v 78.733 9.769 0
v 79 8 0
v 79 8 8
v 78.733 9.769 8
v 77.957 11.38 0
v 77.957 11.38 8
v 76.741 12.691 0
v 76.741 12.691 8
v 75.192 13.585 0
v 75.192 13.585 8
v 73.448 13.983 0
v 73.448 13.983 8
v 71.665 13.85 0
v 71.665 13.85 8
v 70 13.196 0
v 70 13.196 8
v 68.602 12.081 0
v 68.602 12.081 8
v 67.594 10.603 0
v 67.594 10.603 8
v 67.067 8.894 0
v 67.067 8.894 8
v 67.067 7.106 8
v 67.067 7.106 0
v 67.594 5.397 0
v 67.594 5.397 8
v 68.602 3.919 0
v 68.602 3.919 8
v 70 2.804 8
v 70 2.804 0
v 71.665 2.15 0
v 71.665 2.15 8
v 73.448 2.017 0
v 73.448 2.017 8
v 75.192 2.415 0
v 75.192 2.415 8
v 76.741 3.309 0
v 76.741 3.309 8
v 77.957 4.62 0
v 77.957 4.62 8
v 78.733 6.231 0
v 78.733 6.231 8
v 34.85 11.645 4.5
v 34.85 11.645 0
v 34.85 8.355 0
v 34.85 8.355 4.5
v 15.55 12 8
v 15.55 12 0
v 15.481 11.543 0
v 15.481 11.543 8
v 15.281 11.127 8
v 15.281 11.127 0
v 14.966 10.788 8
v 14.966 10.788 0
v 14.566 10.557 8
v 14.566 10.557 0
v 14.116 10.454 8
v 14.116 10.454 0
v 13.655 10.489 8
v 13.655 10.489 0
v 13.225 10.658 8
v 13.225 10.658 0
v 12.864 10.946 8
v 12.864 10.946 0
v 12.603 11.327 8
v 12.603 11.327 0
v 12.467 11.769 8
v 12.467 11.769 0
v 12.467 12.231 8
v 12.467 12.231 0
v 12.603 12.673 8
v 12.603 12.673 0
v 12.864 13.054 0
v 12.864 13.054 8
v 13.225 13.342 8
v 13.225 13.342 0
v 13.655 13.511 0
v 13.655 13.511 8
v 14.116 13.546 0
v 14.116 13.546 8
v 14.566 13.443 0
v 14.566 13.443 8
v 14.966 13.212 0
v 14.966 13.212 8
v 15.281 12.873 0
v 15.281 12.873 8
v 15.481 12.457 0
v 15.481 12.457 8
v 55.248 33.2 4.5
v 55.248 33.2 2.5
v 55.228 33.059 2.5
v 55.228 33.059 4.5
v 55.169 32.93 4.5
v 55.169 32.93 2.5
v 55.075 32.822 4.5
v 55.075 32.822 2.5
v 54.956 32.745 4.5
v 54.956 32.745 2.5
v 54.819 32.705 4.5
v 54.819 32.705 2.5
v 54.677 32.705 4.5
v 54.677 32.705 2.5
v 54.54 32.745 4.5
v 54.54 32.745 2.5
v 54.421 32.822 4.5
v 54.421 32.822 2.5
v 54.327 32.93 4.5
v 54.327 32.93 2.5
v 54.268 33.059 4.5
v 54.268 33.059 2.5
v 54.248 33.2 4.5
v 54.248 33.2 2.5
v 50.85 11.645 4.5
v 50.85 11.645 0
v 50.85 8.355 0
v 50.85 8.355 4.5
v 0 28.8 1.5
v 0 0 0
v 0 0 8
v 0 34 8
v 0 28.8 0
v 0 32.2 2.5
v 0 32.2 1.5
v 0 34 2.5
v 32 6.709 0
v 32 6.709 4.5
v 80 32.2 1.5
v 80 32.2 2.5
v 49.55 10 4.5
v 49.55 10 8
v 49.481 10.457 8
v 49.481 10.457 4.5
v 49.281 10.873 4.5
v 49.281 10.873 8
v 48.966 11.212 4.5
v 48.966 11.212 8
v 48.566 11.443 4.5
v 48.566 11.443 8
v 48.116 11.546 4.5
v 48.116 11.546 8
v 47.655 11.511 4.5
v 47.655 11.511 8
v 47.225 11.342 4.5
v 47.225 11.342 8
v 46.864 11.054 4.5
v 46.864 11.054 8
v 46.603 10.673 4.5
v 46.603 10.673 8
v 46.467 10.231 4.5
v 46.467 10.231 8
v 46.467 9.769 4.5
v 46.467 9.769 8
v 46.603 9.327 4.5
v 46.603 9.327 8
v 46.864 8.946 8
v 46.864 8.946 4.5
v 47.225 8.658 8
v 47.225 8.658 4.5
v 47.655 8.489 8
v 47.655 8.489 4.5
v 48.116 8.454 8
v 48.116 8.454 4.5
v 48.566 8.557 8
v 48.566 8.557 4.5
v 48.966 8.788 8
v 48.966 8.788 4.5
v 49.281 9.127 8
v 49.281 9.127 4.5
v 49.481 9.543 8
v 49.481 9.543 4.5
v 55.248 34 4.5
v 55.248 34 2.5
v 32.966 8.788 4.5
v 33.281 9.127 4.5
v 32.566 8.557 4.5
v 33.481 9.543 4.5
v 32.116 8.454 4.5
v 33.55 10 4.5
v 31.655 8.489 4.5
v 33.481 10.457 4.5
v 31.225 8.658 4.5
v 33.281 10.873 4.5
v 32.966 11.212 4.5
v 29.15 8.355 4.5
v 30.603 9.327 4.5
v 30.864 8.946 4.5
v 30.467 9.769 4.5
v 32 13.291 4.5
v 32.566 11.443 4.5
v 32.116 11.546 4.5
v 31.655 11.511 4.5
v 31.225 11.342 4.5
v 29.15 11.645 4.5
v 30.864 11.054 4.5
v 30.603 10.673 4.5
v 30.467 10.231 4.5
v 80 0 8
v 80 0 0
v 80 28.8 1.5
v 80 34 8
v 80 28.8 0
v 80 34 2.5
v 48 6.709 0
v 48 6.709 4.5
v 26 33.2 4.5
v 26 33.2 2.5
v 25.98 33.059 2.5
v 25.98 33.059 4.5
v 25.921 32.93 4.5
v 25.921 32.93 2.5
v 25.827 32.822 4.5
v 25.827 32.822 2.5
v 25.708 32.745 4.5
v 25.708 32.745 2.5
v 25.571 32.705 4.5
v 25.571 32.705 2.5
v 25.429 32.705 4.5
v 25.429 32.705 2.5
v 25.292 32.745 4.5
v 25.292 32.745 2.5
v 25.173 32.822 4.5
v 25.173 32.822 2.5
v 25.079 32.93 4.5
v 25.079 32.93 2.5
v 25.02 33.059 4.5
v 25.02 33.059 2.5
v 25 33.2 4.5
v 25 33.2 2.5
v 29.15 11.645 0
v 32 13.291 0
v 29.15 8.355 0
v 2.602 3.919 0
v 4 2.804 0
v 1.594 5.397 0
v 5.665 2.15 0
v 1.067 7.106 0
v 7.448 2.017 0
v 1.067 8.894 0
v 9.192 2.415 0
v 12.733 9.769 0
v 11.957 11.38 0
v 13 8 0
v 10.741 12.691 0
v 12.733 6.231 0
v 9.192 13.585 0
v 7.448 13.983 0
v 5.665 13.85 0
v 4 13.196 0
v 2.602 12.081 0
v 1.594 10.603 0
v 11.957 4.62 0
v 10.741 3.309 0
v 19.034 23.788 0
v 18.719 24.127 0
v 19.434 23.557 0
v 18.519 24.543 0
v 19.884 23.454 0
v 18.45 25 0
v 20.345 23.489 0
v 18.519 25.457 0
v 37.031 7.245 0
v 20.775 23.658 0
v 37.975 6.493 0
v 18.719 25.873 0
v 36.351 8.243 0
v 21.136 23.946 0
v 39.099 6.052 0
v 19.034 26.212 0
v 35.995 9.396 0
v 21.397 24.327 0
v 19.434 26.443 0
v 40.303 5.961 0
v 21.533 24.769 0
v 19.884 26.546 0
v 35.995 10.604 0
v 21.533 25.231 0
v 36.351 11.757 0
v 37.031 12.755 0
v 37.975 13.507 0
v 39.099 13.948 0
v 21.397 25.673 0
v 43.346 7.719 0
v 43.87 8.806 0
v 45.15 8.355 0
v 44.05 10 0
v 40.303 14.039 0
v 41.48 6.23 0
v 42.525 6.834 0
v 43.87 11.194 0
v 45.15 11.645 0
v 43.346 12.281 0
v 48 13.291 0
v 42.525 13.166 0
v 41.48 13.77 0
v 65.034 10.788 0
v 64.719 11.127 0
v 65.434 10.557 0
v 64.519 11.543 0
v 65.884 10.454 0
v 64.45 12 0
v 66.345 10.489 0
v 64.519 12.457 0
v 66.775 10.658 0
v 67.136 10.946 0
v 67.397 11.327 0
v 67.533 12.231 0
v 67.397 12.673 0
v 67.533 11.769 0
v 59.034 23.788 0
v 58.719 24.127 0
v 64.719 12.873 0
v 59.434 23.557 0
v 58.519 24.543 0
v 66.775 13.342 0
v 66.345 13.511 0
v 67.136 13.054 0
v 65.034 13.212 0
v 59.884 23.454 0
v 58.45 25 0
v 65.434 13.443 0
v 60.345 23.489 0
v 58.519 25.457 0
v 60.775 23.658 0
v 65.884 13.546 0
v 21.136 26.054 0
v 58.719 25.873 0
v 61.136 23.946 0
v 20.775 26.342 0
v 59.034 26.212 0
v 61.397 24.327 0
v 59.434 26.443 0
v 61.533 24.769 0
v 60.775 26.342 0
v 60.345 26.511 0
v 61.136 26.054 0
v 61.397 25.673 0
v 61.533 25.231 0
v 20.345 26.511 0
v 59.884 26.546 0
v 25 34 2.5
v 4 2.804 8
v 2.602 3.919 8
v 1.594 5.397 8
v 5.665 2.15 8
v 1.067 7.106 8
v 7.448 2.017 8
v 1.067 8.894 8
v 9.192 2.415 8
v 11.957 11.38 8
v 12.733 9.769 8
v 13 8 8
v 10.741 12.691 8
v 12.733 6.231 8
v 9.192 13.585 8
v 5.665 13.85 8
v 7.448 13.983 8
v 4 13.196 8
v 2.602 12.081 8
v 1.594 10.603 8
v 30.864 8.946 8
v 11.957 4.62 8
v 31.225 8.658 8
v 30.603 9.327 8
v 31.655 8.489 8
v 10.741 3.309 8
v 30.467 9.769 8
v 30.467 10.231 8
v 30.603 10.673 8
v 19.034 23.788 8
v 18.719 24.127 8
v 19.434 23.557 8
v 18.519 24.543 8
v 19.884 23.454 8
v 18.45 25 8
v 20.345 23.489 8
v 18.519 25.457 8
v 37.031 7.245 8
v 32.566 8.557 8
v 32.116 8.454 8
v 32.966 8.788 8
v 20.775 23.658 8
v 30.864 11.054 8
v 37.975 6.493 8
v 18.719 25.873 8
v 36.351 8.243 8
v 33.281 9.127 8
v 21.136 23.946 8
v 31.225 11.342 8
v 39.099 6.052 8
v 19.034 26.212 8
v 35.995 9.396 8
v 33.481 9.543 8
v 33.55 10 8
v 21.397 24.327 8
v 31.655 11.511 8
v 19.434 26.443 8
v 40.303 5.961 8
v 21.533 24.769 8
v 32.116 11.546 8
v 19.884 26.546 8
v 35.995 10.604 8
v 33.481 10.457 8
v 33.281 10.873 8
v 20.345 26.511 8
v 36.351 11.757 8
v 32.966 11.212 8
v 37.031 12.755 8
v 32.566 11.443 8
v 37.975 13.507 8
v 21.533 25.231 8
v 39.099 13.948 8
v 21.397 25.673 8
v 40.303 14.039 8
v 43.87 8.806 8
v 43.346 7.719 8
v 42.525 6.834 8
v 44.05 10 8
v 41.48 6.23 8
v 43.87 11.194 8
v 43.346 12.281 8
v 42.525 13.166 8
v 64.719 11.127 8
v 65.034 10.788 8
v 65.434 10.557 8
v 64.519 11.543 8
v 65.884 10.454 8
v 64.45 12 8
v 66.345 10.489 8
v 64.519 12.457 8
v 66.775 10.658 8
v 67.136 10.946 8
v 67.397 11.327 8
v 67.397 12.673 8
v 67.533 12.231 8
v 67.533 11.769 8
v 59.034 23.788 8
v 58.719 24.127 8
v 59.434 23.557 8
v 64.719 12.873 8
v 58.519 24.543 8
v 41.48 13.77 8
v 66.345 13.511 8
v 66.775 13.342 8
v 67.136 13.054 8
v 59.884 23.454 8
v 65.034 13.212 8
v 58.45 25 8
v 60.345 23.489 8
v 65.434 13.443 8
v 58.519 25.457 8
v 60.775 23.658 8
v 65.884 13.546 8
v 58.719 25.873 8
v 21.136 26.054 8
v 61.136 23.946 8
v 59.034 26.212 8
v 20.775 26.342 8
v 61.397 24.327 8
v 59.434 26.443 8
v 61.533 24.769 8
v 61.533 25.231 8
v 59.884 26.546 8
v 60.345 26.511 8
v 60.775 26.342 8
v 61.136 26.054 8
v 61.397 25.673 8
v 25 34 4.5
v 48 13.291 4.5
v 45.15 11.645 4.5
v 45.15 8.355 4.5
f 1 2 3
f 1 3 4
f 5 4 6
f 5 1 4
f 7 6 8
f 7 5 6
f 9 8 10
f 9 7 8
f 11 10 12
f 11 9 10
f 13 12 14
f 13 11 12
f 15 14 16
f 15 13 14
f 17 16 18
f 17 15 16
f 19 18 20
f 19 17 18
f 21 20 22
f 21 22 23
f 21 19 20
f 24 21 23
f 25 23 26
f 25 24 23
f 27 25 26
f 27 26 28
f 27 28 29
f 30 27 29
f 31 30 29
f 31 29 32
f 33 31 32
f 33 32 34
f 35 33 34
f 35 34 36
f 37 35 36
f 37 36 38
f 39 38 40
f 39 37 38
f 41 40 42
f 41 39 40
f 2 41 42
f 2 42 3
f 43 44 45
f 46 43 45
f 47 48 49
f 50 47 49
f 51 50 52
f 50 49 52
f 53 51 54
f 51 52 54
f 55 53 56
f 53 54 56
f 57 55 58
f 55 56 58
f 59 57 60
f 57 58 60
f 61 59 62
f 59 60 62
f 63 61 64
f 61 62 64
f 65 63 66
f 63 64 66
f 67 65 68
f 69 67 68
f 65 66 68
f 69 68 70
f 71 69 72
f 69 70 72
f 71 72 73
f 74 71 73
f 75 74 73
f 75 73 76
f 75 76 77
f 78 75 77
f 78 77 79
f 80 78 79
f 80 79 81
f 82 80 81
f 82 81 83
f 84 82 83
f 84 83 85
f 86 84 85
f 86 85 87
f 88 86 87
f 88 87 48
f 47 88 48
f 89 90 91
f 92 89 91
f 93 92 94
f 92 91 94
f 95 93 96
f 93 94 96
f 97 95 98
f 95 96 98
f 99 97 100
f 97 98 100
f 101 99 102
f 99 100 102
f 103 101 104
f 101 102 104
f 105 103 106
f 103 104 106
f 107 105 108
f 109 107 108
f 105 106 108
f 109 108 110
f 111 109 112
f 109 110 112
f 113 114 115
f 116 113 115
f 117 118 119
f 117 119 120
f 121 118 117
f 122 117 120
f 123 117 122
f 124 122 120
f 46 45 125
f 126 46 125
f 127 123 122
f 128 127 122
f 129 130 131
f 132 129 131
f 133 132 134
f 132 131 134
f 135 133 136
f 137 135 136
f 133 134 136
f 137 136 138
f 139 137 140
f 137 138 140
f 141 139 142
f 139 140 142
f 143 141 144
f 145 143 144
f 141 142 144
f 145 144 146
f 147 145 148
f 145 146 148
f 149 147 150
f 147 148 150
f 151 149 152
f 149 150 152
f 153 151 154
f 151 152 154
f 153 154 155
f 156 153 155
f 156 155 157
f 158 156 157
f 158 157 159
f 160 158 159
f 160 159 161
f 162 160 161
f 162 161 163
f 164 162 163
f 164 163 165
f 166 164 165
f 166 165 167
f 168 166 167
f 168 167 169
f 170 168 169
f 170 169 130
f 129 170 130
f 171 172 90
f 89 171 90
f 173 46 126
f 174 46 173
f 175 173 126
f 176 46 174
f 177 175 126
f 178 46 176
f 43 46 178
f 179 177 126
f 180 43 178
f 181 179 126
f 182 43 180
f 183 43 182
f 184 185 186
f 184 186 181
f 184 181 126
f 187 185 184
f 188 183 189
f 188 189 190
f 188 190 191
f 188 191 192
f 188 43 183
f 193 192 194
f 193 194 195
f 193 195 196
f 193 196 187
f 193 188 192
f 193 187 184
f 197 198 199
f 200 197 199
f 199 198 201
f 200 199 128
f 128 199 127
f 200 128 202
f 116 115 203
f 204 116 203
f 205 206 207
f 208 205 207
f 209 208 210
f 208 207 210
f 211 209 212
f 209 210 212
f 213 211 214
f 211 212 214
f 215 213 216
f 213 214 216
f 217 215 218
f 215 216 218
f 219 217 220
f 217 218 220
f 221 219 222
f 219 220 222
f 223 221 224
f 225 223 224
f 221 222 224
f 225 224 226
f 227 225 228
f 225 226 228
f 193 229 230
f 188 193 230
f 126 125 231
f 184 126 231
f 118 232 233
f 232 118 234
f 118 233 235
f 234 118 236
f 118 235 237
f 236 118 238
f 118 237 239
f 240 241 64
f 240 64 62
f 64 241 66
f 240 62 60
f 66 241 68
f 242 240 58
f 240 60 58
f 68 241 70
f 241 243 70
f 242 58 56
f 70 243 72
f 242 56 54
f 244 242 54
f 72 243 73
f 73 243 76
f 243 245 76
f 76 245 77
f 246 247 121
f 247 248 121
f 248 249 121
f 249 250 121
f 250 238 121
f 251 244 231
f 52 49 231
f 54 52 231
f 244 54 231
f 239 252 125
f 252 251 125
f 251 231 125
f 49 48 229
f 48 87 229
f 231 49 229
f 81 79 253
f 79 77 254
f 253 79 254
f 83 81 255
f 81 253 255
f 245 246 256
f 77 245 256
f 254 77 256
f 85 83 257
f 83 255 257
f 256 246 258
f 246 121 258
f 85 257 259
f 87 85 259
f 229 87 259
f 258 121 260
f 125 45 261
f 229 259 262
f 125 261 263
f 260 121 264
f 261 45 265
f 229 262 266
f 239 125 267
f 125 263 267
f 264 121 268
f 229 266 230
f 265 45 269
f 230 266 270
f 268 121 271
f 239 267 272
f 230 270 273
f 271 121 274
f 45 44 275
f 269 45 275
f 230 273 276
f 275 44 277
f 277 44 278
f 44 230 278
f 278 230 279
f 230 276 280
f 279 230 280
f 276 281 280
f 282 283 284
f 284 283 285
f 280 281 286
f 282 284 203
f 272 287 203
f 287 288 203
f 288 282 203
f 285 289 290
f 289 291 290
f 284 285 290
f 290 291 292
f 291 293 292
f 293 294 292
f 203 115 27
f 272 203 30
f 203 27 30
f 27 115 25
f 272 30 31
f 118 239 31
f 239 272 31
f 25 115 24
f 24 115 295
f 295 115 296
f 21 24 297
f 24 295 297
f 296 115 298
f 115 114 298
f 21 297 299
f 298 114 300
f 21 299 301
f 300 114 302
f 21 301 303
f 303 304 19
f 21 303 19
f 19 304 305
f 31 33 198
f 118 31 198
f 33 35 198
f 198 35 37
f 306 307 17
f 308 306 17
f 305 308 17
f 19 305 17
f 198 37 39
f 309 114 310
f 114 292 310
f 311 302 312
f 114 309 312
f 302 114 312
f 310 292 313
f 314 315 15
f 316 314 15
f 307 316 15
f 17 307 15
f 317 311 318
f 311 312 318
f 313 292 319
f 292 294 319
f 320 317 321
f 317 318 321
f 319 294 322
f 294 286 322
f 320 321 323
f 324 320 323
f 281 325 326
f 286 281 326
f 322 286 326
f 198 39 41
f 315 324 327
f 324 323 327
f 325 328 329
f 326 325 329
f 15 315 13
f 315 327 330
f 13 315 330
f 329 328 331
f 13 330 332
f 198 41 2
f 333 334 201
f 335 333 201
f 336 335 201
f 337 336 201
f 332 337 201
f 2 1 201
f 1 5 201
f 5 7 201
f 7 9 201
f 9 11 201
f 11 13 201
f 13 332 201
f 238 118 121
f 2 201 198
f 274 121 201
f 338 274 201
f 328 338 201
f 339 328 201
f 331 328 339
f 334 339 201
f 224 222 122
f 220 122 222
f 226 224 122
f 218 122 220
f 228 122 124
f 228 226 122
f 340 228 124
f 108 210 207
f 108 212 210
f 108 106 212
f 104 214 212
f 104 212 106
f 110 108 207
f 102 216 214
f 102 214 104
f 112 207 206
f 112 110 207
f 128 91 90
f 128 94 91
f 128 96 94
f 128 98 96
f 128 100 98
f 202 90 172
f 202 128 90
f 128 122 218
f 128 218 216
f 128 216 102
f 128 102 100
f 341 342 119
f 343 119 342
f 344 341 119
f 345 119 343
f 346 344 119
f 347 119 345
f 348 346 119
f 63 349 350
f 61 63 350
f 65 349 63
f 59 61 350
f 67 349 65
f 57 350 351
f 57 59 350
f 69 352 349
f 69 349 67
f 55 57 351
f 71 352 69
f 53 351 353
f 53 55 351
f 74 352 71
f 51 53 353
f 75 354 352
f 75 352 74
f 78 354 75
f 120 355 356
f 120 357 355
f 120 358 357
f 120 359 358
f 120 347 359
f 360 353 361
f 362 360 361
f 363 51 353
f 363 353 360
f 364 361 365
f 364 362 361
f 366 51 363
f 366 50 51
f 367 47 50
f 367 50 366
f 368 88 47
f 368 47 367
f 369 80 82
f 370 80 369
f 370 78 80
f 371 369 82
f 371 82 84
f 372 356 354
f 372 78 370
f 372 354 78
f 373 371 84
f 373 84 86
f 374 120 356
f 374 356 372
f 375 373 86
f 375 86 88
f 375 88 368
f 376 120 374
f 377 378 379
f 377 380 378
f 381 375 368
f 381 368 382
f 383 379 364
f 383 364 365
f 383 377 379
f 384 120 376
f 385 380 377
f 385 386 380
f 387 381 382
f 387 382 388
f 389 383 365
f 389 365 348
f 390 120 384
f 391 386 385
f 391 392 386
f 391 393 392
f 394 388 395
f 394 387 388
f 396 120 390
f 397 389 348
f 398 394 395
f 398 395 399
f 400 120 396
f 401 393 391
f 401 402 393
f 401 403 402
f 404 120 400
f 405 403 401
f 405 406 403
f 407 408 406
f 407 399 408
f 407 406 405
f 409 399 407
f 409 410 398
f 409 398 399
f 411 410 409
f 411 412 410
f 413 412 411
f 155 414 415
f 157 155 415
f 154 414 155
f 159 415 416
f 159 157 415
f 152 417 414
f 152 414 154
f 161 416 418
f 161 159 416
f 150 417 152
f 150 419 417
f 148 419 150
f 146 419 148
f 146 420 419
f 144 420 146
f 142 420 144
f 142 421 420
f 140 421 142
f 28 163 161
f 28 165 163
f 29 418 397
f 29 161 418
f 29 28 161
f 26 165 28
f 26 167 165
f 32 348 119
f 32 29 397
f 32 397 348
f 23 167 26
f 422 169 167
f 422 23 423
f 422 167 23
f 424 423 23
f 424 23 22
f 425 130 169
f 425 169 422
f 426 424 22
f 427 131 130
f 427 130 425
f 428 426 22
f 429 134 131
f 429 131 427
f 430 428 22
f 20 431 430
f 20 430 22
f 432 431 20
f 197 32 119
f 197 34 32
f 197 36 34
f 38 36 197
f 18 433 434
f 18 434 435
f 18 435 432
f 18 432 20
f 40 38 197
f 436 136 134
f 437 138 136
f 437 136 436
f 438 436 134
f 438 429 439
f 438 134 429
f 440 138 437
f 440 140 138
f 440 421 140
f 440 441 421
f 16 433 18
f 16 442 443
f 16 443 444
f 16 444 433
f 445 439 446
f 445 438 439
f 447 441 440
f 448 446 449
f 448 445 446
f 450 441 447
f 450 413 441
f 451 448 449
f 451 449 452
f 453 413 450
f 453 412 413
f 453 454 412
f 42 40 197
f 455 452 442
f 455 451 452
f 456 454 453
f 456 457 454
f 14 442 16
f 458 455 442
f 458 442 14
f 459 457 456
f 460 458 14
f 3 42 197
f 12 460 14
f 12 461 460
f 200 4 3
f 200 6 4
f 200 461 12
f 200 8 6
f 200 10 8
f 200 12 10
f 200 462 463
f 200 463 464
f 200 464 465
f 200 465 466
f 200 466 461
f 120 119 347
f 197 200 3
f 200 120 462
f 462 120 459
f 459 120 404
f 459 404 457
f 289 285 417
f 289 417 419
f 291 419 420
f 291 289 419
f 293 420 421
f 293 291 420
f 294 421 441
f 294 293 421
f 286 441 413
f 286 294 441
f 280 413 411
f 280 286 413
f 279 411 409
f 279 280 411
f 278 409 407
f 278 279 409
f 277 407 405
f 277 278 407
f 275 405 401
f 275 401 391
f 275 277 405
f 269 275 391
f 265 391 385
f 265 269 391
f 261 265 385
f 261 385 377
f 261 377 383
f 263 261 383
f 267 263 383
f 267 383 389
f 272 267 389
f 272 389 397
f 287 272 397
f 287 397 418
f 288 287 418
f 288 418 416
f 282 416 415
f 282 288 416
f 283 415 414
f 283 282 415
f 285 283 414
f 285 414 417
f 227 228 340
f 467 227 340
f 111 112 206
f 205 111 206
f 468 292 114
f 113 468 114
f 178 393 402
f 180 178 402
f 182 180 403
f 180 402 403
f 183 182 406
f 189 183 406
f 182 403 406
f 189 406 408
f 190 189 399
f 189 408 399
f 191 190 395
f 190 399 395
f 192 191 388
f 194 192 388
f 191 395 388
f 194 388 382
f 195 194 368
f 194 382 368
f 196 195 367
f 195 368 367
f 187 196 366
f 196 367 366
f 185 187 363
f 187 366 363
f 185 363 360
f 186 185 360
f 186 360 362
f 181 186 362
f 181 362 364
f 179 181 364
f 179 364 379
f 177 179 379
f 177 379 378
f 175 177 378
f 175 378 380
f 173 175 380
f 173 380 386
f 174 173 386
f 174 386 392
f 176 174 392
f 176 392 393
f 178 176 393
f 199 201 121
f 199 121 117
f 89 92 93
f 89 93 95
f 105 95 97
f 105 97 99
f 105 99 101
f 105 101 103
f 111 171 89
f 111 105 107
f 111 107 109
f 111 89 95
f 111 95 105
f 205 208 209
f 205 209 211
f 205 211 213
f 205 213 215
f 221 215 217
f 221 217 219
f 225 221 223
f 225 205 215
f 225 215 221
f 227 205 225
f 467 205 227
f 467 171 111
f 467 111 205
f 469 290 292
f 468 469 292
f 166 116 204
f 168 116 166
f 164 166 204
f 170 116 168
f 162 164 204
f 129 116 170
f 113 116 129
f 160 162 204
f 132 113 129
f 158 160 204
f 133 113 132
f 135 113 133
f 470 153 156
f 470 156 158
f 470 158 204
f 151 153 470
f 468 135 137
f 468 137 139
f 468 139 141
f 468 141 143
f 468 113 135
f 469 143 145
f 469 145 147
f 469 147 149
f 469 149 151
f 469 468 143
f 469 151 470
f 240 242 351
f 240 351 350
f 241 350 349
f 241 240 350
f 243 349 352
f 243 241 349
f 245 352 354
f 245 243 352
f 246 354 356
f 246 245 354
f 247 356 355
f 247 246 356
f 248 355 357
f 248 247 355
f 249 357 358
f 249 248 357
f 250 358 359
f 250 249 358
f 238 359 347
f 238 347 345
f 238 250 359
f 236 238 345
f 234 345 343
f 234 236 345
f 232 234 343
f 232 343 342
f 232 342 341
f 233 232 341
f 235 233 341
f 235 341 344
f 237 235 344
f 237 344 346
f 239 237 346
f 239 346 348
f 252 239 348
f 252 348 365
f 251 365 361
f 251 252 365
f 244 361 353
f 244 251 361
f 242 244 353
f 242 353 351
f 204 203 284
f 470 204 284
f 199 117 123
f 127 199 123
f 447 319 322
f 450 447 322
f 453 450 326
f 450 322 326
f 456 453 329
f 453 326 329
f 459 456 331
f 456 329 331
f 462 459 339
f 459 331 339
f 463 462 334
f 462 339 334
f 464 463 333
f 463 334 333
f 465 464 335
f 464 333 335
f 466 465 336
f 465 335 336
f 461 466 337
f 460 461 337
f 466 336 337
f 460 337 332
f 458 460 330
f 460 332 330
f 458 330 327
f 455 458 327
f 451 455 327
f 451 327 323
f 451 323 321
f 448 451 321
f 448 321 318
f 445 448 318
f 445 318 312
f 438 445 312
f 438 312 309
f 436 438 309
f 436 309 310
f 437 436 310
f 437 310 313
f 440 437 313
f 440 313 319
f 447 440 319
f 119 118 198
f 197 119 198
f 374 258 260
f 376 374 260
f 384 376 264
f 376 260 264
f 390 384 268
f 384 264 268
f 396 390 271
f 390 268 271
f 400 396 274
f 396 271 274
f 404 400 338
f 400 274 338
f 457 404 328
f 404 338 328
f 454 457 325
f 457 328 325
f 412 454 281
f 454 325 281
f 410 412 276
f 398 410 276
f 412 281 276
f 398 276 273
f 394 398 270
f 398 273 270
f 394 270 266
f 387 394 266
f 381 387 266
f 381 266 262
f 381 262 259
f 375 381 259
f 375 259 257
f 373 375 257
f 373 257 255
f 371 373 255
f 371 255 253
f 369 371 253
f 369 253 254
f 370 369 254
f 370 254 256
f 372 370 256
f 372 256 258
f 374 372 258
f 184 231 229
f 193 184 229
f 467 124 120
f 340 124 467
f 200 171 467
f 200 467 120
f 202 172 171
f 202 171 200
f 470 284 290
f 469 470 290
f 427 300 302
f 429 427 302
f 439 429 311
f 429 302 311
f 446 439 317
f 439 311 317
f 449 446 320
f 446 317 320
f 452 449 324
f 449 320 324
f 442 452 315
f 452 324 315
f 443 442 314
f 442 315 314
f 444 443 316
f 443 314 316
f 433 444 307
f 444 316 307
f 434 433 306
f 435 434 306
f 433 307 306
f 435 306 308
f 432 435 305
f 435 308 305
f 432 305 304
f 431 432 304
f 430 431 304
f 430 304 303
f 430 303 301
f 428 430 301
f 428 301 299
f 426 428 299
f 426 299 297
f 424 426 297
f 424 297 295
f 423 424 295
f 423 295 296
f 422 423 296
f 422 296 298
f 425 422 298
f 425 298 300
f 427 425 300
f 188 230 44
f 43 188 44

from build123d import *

# Parameters (mm, degrees)
SKETCH_2_W           = 80
SKETCH_2_H           = 34
SKETCH_2_R           = 6
SKETCH_2_R_2         = 4.05
EXTRUDE_1_DEPTH      = 8
CUT_EXTRUDE_2_DEPTH  = 88.292611371
SKETCH_5_R           = 1.55
CUT_EXTRUDE_3_DEPTH  = 88.292611371
CUT_EXTRUDE_5_DEPTH  = 4.5
SKETCH_11_R          = 1.55
CUT_EXTRUDE_7_DEPTH  = 88.292611371
CUT_EXTRUDE_11_DEPTH = 2
SKETCH_22_R          = 1.55
CUT_EXTRUDE_13_DEPTH = 88.292611371


with BuildPart() as part:
    # 草图2 → 凸台-拉伸1 (new body)
    with BuildSketch(Plane.XY):
        with Locations((40, 17)):
            Rectangle(SKETCH_2_W, SKETCH_2_H)
        with Locations((7, 8)):
            Circle(SKETCH_2_R, mode=Mode.SUBTRACT)
        with Locations((40, 10)):
            Circle(SKETCH_2_R_2, mode=Mode.SUBTRACT)
        with Locations((73, 8)):
            Circle(SKETCH_2_R, mode=Mode.SUBTRACT)
    extrude(amount=EXTRUDE_1_DEPTH)

    # 草图4 → 切除-拉伸2 (cut, through all)
    with BuildSketch(Plane(origin=(80, 0, 0), x_dir=(0, 0, -1), z_dir=(1, 0, 0))):
        Polygon((-1.5, 32.2), (-2.5, 32.2), (-2.5, 34), (0, 34), (0, 28.8), (-1.5, 28.8), align=None)
    extrude(amount=-CUT_EXTRUDE_2_DEPTH, mode=Mode.SUBTRACT)

    # 草图5 → 切除-拉伸3 (cut, through all)
    with BuildSketch(Plane.XY.offset(8)):
        with Locations((48, 10)):
            Circle(SKETCH_5_R)
        with Locations((32, 10)):
            Circle(SKETCH_5_R)
    extrude(amount=-CUT_EXTRUDE_3_DEPTH, mode=Mode.SUBTRACT)

    # 草图8 → 切除-拉伸5 (cut)
    with BuildSketch(Plane(origin=(0, 0, 0), x_dir=(-1, 0, 0), z_dir=(0, 0, -1))):
        Polygon((-45.15, 8.354551733), (-45.15, 11.645448267), (-48, 13.290896534), (-50.85, 11.645448267), (-50.85, 8.354551733), (-48, 6.709103466), align=None)
        Polygon((-34.85, 8.354551733), (-32, 6.709103466), (-29.15, 8.354551733), (-29.15, 11.645448267), (-32, 13.290896534), (-34.85, 11.645448267), align=None)
    extrude(amount=-CUT_EXTRUDE_5_DEPTH, mode=Mode.SUBTRACT)

    # 草图11 → 切除-拉伸7 (cut, through all)
    with BuildSketch(Plane(origin=(0, 0, 0), x_dir=(-1, 0, 0), z_dir=(0, 0, -1))):
        with Locations((-60, 25)):
            Circle(SKETCH_11_R)
        with Locations((-20, 25)):
            Circle(SKETCH_11_R)
    extrude(amount=-CUT_EXTRUDE_7_DEPTH, mode=Mode.SUBTRACT)

    # 草图19 → 切除-拉伸11 (cut)
    with BuildSketch(Plane(origin=(0, 0, 2.5), x_dir=(-1, 0, 0), z_dir=(0, 0, -1))):
        with BuildLine():
            Line((-25, 34), (-55.247938178, 34))
            Line((-55.247938178, 34), (-55.247938178, 33.2))
            ThreePointArc((-55.247938178, 33.2), (-54.747938178, 32.7), (-54.247938178, 33.2))
            Line((-54.247938178, 33.2), (-26, 33.2))
            ThreePointArc((-26, 33.2), (-25.5, 32.7), (-25, 33.2))
            Line((-25, 33.2), (-25, 34))
        make_face()
    extrude(amount=-CUT_EXTRUDE_11_DEPTH, mode=Mode.SUBTRACT)

    # 草图22 → 切除-拉伸13 (cut, through all)
    with BuildSketch(Plane(origin=(0, 0, 0), x_dir=(-1, 0, 0), z_dir=(0, 0, -1))):
        with Locations((-66, 12)):
            Circle(SKETCH_22_R)
        with Locations(Location((-14, 12, 0), (0, 0, 180))):
            Circle(SKETCH_22_R)
    extrude(amount=-CUT_EXTRUDE_13_DEPTH, mode=Mode.SUBTRACT)


solid = part.part
